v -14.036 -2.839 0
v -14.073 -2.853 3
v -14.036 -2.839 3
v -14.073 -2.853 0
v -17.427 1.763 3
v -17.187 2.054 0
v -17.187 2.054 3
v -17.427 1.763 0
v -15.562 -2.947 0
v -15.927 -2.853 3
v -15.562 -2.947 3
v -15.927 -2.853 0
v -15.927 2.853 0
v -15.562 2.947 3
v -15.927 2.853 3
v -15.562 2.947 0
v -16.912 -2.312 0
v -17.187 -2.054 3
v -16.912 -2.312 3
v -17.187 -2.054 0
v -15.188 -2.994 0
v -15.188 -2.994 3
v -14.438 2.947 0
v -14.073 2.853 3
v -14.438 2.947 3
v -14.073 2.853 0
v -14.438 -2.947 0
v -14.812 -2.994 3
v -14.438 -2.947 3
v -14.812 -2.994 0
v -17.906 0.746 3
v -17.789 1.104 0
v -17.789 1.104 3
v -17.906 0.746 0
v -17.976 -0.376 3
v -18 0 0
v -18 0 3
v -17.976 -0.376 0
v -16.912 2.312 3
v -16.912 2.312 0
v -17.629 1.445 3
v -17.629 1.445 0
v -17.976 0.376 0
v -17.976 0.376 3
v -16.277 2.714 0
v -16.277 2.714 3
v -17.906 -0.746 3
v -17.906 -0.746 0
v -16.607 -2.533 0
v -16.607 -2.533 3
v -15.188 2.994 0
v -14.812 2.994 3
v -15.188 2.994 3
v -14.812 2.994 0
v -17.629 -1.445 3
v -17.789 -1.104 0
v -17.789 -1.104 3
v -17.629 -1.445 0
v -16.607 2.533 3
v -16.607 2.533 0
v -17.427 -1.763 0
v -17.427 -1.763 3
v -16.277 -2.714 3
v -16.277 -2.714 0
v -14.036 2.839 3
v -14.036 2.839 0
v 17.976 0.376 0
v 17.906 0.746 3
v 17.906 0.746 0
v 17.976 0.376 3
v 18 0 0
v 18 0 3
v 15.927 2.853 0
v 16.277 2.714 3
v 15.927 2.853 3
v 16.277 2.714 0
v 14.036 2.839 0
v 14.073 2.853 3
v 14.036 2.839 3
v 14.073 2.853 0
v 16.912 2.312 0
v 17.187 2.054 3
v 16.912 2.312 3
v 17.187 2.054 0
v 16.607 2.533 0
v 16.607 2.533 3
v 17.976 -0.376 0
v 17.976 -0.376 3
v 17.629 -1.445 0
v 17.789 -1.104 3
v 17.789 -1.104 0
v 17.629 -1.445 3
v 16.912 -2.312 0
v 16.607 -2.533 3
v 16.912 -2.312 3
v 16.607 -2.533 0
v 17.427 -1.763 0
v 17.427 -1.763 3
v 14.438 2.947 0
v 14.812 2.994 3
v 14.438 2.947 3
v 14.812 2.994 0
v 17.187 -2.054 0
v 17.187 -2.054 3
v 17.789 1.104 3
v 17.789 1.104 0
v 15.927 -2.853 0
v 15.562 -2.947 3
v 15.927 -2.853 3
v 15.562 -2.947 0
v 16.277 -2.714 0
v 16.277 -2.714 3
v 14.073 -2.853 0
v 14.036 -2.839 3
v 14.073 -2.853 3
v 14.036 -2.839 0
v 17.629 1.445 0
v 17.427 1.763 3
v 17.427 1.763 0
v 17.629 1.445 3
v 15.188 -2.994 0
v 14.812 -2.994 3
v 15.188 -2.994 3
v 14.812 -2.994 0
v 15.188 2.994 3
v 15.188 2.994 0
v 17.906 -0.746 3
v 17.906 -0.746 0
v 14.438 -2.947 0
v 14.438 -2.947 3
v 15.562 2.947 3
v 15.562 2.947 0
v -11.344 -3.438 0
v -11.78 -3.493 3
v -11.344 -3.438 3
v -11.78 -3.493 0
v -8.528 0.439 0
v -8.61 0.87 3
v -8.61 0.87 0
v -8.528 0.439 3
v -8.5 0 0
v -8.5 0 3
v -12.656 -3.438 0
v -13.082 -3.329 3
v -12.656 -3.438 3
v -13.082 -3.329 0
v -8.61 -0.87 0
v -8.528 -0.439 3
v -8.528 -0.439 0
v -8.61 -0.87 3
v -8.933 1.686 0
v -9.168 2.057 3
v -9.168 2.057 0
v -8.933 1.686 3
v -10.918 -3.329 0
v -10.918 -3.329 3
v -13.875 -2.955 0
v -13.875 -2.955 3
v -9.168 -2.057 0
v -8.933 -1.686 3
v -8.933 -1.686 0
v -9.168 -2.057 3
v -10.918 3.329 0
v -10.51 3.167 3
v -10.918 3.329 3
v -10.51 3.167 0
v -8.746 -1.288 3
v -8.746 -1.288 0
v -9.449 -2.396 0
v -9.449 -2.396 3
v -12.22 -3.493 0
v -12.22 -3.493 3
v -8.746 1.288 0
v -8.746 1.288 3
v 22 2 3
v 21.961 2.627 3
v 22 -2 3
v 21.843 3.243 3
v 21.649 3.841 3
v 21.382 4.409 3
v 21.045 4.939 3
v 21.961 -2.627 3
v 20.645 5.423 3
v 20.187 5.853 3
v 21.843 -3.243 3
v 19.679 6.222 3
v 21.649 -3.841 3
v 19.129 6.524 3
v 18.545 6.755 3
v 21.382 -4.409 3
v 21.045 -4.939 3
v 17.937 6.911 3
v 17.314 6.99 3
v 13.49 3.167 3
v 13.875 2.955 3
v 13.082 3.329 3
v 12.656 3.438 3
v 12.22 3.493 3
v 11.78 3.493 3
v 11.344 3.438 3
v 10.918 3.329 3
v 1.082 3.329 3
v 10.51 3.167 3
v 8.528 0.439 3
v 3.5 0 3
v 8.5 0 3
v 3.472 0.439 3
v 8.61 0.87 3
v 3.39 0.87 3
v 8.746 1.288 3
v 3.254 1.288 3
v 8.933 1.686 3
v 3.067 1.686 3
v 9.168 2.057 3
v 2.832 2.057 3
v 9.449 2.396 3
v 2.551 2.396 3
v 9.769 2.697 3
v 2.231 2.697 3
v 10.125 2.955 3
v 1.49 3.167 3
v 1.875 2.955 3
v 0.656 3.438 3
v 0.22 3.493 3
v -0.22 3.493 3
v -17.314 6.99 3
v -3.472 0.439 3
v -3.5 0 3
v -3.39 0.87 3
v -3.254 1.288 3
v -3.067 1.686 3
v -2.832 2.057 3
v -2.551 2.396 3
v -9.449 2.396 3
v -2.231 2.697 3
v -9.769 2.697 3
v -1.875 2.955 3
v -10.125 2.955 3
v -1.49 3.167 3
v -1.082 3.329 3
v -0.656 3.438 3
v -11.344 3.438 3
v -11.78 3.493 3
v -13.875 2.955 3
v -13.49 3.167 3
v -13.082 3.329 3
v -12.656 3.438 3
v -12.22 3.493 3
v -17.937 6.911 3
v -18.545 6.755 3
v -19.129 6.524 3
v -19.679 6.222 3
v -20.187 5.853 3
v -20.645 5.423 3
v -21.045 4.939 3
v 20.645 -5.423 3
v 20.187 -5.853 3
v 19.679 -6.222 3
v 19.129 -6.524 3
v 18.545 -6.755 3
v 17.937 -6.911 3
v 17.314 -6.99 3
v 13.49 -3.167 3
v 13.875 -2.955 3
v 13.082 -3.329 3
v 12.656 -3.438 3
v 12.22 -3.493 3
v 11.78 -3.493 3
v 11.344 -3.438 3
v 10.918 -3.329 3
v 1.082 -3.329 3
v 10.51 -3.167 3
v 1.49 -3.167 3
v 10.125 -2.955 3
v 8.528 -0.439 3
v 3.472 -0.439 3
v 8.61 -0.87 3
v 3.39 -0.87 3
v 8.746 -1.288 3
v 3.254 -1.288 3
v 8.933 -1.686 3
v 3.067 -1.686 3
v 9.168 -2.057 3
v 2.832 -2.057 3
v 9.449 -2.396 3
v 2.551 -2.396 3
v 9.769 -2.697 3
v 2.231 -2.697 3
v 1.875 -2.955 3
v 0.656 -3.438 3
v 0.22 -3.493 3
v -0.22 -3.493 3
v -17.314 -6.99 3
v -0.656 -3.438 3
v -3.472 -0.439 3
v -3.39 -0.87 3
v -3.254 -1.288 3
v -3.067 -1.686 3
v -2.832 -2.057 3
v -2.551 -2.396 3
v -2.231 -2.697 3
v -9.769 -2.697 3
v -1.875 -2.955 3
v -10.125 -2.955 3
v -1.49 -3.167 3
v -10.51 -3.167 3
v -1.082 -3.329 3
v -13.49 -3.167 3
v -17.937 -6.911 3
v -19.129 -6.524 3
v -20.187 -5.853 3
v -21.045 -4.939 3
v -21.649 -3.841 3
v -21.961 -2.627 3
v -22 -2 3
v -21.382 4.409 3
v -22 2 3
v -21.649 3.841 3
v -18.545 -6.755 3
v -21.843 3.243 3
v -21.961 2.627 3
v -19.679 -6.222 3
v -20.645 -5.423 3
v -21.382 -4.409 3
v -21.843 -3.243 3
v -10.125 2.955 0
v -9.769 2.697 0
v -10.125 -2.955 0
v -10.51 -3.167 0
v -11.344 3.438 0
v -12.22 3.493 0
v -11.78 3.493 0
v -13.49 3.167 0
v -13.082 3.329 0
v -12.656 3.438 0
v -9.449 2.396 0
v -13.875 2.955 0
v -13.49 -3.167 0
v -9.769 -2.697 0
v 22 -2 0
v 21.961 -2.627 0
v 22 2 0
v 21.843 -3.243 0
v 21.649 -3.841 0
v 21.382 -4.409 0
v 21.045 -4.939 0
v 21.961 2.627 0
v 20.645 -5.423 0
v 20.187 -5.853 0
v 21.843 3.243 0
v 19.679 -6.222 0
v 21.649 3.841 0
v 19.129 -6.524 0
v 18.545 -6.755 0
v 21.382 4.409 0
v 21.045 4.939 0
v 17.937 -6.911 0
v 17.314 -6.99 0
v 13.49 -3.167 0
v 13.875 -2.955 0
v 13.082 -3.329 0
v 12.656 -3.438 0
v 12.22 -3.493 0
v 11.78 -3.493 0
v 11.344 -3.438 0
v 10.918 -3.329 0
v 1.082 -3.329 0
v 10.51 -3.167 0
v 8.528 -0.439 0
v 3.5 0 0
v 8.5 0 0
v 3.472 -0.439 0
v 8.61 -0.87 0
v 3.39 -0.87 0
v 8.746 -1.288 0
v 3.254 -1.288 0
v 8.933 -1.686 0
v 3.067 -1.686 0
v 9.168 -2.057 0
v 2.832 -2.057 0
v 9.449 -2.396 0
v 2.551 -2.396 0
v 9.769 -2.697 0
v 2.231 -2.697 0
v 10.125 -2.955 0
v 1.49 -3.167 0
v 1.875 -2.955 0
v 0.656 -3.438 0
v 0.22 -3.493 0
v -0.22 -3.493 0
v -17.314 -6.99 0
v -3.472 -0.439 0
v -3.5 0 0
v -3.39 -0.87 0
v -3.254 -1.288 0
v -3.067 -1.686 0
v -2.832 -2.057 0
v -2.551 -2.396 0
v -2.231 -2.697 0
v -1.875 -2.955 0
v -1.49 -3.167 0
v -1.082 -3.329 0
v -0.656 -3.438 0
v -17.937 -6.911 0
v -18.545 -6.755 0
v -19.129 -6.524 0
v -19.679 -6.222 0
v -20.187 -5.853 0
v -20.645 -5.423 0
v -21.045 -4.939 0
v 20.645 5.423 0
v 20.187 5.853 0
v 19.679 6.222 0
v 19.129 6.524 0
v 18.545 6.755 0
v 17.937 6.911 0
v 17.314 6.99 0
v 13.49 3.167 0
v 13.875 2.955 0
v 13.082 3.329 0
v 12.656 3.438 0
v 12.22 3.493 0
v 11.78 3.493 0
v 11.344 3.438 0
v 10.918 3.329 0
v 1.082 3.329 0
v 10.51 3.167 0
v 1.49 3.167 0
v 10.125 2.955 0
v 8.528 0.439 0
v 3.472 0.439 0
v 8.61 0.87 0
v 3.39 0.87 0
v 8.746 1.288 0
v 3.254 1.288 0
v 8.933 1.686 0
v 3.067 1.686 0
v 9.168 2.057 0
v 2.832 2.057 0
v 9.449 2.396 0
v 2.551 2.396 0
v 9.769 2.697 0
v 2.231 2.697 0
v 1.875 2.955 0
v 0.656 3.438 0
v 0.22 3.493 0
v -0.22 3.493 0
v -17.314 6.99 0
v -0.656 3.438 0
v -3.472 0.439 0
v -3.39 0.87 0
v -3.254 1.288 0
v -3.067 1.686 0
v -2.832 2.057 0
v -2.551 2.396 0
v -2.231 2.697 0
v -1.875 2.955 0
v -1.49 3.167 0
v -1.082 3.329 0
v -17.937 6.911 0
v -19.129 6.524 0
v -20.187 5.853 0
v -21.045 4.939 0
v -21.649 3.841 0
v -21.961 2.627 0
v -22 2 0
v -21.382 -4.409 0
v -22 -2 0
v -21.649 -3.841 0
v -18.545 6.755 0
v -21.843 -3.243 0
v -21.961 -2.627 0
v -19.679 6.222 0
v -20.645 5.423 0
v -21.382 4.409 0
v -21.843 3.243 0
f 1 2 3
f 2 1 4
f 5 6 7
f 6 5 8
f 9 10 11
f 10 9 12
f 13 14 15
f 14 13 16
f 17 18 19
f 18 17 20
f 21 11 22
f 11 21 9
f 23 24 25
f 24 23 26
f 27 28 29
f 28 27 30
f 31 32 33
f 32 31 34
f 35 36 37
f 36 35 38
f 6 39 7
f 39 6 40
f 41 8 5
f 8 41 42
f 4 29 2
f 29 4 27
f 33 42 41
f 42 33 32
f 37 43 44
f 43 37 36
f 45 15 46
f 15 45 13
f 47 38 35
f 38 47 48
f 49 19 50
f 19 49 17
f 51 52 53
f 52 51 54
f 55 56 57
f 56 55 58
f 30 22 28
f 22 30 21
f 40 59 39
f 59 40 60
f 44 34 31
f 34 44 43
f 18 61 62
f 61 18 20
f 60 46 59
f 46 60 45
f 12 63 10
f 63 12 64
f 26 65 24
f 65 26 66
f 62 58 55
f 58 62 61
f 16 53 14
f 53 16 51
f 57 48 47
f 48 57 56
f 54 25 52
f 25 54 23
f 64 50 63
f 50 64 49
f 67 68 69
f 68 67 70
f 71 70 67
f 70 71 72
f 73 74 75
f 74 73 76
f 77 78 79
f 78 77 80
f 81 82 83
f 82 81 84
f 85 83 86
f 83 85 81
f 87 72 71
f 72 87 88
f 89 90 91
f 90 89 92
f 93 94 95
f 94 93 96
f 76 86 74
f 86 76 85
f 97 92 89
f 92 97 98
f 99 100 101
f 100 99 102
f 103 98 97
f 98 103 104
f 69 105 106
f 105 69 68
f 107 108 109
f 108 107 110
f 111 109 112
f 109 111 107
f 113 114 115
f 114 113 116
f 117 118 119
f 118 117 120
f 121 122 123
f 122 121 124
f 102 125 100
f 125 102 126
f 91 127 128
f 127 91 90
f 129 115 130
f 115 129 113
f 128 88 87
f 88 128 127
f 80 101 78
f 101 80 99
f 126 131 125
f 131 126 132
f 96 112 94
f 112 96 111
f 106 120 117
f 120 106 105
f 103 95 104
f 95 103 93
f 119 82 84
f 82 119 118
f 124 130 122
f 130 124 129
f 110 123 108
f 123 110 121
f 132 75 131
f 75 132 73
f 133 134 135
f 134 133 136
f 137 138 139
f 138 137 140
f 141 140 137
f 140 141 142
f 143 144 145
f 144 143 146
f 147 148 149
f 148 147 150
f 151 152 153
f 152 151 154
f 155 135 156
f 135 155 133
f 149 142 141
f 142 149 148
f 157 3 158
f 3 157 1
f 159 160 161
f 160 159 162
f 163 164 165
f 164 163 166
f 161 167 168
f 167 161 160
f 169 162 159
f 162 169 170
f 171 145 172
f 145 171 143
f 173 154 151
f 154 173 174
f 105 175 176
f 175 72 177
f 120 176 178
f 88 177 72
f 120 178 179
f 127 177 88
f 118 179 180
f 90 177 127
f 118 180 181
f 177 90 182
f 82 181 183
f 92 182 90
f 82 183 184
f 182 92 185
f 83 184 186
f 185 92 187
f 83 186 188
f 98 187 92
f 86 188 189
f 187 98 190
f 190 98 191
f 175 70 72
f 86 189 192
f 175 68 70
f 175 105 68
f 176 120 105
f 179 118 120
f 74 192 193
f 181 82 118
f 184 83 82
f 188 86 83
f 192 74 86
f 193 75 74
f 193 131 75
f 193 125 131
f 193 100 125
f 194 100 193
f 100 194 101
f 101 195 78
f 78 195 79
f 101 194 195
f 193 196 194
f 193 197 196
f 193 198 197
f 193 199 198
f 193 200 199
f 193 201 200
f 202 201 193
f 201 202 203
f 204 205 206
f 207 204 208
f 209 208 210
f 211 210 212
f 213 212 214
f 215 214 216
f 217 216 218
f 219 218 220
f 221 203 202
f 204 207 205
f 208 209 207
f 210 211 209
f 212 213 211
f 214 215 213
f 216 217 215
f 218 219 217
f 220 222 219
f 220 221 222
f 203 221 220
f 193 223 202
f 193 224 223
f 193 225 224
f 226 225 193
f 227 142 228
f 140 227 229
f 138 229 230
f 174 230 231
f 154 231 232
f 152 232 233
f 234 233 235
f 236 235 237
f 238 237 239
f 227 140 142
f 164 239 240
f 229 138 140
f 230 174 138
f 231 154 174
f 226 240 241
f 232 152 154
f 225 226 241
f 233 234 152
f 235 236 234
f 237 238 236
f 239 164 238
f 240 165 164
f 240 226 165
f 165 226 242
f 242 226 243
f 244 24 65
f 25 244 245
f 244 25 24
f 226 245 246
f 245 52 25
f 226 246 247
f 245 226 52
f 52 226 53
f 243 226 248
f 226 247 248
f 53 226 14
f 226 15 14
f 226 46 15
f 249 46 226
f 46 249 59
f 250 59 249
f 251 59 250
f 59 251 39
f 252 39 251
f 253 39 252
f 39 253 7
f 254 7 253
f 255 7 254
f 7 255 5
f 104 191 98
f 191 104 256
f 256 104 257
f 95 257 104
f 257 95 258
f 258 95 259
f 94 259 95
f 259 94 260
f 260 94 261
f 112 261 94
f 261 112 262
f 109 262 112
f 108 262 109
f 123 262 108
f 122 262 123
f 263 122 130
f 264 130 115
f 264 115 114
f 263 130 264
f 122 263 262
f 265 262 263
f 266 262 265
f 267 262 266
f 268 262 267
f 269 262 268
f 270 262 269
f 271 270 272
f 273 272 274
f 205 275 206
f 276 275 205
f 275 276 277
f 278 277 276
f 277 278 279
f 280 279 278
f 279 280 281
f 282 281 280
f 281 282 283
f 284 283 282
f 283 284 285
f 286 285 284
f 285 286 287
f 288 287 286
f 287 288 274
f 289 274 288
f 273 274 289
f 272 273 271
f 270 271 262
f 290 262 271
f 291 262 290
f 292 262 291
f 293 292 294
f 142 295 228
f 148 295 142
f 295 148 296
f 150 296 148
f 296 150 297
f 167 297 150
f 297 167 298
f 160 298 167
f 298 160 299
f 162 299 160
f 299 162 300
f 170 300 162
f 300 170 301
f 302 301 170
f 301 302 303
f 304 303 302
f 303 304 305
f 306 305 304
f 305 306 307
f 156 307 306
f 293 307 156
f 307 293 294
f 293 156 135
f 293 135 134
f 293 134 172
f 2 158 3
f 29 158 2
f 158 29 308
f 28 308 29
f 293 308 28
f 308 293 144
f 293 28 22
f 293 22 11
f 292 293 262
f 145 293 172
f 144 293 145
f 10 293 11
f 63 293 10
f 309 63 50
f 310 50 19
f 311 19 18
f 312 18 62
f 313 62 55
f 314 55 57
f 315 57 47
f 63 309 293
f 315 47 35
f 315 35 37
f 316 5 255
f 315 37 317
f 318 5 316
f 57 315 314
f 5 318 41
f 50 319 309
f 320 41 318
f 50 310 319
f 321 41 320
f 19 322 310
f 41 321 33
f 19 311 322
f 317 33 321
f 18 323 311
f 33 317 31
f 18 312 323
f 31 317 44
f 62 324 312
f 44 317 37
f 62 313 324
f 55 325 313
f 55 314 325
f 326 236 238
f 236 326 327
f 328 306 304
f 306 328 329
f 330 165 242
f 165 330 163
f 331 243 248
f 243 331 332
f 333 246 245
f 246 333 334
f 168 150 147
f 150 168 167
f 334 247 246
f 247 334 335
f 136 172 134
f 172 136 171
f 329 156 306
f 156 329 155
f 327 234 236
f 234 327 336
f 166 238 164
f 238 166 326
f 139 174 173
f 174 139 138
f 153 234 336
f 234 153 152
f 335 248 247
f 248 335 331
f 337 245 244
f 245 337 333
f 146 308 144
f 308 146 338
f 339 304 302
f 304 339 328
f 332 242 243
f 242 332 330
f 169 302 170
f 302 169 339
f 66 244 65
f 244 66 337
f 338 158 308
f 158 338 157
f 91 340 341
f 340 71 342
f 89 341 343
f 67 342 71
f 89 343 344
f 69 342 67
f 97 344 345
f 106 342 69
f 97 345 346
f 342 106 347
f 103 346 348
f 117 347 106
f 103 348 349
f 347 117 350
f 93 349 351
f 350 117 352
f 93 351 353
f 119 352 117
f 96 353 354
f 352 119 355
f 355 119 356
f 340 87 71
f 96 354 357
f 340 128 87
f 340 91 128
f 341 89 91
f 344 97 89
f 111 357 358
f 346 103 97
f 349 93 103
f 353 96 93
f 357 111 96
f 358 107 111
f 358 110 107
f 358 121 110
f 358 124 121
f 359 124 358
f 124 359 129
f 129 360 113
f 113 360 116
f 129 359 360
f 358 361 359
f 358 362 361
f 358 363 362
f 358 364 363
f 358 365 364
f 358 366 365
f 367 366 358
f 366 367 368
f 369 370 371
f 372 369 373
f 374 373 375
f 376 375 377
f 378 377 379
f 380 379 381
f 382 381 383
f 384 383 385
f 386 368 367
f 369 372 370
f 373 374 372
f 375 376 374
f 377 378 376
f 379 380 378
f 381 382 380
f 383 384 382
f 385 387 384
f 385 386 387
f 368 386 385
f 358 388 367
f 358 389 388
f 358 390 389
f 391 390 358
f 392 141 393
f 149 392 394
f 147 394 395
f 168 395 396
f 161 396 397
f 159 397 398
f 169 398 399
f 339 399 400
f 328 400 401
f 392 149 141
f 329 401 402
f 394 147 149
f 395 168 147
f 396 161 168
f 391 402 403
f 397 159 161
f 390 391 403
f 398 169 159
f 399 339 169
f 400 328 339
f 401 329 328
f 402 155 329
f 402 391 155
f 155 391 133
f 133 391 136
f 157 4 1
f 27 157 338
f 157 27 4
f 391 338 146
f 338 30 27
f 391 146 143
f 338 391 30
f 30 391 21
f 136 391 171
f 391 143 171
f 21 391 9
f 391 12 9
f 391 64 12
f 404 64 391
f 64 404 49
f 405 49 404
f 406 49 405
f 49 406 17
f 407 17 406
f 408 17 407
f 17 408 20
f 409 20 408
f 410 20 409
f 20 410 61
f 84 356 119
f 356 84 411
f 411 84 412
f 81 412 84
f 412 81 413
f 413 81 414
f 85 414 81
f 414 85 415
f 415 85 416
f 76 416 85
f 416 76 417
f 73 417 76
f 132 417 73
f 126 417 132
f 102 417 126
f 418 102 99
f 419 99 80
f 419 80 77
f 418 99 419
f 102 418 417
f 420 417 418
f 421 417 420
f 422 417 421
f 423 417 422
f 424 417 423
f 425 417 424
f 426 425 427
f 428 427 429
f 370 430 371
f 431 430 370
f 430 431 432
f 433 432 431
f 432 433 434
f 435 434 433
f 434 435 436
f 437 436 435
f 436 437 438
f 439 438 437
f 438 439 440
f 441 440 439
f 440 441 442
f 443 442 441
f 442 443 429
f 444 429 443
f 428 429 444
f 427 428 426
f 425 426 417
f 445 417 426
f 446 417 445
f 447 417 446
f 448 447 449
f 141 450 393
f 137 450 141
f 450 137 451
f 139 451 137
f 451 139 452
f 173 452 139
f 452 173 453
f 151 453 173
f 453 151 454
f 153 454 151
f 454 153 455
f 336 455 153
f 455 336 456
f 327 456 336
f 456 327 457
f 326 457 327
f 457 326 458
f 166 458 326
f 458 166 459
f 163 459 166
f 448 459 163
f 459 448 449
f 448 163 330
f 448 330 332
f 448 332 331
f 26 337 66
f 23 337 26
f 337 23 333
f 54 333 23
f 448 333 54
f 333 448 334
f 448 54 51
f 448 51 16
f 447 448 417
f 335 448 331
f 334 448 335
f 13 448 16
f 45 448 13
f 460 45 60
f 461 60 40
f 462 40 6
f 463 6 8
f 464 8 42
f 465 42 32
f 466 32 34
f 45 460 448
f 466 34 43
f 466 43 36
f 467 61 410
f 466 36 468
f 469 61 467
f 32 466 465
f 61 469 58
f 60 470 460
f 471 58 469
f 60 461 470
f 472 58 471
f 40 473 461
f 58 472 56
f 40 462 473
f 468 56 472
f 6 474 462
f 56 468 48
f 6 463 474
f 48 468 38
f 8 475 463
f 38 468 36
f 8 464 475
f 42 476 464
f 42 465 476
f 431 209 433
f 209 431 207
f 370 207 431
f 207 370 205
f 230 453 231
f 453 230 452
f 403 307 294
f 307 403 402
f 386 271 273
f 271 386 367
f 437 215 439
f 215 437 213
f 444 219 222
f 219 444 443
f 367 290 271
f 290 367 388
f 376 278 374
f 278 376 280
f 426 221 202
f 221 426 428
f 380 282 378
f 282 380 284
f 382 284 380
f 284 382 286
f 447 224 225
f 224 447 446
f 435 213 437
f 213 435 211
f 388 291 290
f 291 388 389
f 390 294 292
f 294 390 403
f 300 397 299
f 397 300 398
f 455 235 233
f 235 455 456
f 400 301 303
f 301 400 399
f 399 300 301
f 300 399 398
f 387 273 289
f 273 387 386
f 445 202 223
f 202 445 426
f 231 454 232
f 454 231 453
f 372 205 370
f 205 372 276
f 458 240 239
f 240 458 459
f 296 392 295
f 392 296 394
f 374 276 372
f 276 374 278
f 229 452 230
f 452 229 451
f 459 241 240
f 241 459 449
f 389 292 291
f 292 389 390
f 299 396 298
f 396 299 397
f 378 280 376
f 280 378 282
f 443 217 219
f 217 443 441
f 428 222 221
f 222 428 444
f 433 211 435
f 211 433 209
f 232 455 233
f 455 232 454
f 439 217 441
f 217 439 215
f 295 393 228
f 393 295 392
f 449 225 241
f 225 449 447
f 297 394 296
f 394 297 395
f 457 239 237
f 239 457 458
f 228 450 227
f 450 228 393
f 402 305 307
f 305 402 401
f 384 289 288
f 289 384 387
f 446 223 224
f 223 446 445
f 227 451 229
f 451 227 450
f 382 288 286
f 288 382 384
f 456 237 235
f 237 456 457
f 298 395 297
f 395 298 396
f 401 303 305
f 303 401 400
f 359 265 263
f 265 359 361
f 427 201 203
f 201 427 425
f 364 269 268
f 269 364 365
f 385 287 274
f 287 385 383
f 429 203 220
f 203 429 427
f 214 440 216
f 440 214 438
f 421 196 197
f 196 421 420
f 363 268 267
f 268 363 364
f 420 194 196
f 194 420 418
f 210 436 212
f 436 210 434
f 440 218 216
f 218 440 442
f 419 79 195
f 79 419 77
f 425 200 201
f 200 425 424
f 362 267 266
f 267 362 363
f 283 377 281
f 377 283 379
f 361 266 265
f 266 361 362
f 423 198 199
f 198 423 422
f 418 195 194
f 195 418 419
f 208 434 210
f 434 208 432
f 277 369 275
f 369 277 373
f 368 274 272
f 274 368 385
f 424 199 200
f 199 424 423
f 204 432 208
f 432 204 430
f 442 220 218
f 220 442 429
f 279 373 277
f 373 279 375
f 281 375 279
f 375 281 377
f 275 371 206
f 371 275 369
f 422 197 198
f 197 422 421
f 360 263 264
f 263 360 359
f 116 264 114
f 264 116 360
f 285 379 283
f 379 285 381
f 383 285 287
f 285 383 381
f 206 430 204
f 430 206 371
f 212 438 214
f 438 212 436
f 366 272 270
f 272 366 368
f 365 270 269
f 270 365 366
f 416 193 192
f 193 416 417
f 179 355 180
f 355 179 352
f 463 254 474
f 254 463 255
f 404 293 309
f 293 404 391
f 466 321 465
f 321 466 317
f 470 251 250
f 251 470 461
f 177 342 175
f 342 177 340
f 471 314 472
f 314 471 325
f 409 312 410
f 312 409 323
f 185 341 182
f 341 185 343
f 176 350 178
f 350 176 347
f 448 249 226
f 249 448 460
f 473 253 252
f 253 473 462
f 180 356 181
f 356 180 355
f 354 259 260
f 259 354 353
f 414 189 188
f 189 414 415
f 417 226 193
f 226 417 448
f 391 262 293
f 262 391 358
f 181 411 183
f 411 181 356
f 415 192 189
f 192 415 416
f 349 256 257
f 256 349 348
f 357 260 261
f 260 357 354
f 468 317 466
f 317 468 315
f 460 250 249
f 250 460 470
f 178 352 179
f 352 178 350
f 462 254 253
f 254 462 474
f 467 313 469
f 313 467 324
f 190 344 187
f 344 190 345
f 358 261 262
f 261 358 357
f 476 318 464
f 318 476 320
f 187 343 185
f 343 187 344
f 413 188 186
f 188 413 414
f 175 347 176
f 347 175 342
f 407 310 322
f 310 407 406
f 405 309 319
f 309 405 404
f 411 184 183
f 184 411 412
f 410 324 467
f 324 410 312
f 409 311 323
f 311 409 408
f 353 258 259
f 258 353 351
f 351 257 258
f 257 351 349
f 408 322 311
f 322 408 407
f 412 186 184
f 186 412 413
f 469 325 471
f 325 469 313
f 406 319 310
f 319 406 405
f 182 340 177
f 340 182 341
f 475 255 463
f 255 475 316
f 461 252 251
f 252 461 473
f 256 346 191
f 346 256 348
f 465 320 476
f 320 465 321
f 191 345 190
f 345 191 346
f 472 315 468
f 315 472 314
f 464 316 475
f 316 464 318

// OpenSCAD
$fn = 50;


difference() {
	union() {
		hull() {
			translate(v = [-17.0000000000, 2.0000000000, 0]) {
				cylinder(h = 3, r = 5);
			}
			translate(v = [17.0000000000, 2.0000000000, 0]) {
				cylinder(h = 3, r = 5);
			}
			translate(v = [-17.0000000000, -2.0000000000, 0]) {
				cylinder(h = 3, r = 5);
			}
			translate(v = [17.0000000000, -2.0000000000, 0]) {
				cylinder(h = 3, r = 5);
			}
		}
	}
	union() {
		#translate(v = [-15.0000000000, 0.0000000000, -100.0000000000]) {
			cylinder(h = 200, r = 3.0000000000);
		}
		#translate(v = [-15.0000000000, 0.0000000000, -100.0000000000]) {
			cylinder(h = 200, r = 3.0000000000);
		}
		#translate(v = [15.0000000000, 0.0000000000, -100.0000000000]) {
			cylinder(h = 200, r = 3.0000000000);
		}
		#translate(v = [15.0000000000, 0.0000000000, -100.0000000000]) {
			cylinder(h = 200, r = 3.0000000000);
		}
		#translate(v = [-12.0000000000, 0, 0]) {
			cylinder(h = 3, r = 3.5000000000);
		}
		#cylinder(h = 3, r = 3.5000000000);
		#translate(v = [12.0000000000, 0, 0]) {
			cylinder(h = 3, r = 3.5000000000);
		}
	}
}
